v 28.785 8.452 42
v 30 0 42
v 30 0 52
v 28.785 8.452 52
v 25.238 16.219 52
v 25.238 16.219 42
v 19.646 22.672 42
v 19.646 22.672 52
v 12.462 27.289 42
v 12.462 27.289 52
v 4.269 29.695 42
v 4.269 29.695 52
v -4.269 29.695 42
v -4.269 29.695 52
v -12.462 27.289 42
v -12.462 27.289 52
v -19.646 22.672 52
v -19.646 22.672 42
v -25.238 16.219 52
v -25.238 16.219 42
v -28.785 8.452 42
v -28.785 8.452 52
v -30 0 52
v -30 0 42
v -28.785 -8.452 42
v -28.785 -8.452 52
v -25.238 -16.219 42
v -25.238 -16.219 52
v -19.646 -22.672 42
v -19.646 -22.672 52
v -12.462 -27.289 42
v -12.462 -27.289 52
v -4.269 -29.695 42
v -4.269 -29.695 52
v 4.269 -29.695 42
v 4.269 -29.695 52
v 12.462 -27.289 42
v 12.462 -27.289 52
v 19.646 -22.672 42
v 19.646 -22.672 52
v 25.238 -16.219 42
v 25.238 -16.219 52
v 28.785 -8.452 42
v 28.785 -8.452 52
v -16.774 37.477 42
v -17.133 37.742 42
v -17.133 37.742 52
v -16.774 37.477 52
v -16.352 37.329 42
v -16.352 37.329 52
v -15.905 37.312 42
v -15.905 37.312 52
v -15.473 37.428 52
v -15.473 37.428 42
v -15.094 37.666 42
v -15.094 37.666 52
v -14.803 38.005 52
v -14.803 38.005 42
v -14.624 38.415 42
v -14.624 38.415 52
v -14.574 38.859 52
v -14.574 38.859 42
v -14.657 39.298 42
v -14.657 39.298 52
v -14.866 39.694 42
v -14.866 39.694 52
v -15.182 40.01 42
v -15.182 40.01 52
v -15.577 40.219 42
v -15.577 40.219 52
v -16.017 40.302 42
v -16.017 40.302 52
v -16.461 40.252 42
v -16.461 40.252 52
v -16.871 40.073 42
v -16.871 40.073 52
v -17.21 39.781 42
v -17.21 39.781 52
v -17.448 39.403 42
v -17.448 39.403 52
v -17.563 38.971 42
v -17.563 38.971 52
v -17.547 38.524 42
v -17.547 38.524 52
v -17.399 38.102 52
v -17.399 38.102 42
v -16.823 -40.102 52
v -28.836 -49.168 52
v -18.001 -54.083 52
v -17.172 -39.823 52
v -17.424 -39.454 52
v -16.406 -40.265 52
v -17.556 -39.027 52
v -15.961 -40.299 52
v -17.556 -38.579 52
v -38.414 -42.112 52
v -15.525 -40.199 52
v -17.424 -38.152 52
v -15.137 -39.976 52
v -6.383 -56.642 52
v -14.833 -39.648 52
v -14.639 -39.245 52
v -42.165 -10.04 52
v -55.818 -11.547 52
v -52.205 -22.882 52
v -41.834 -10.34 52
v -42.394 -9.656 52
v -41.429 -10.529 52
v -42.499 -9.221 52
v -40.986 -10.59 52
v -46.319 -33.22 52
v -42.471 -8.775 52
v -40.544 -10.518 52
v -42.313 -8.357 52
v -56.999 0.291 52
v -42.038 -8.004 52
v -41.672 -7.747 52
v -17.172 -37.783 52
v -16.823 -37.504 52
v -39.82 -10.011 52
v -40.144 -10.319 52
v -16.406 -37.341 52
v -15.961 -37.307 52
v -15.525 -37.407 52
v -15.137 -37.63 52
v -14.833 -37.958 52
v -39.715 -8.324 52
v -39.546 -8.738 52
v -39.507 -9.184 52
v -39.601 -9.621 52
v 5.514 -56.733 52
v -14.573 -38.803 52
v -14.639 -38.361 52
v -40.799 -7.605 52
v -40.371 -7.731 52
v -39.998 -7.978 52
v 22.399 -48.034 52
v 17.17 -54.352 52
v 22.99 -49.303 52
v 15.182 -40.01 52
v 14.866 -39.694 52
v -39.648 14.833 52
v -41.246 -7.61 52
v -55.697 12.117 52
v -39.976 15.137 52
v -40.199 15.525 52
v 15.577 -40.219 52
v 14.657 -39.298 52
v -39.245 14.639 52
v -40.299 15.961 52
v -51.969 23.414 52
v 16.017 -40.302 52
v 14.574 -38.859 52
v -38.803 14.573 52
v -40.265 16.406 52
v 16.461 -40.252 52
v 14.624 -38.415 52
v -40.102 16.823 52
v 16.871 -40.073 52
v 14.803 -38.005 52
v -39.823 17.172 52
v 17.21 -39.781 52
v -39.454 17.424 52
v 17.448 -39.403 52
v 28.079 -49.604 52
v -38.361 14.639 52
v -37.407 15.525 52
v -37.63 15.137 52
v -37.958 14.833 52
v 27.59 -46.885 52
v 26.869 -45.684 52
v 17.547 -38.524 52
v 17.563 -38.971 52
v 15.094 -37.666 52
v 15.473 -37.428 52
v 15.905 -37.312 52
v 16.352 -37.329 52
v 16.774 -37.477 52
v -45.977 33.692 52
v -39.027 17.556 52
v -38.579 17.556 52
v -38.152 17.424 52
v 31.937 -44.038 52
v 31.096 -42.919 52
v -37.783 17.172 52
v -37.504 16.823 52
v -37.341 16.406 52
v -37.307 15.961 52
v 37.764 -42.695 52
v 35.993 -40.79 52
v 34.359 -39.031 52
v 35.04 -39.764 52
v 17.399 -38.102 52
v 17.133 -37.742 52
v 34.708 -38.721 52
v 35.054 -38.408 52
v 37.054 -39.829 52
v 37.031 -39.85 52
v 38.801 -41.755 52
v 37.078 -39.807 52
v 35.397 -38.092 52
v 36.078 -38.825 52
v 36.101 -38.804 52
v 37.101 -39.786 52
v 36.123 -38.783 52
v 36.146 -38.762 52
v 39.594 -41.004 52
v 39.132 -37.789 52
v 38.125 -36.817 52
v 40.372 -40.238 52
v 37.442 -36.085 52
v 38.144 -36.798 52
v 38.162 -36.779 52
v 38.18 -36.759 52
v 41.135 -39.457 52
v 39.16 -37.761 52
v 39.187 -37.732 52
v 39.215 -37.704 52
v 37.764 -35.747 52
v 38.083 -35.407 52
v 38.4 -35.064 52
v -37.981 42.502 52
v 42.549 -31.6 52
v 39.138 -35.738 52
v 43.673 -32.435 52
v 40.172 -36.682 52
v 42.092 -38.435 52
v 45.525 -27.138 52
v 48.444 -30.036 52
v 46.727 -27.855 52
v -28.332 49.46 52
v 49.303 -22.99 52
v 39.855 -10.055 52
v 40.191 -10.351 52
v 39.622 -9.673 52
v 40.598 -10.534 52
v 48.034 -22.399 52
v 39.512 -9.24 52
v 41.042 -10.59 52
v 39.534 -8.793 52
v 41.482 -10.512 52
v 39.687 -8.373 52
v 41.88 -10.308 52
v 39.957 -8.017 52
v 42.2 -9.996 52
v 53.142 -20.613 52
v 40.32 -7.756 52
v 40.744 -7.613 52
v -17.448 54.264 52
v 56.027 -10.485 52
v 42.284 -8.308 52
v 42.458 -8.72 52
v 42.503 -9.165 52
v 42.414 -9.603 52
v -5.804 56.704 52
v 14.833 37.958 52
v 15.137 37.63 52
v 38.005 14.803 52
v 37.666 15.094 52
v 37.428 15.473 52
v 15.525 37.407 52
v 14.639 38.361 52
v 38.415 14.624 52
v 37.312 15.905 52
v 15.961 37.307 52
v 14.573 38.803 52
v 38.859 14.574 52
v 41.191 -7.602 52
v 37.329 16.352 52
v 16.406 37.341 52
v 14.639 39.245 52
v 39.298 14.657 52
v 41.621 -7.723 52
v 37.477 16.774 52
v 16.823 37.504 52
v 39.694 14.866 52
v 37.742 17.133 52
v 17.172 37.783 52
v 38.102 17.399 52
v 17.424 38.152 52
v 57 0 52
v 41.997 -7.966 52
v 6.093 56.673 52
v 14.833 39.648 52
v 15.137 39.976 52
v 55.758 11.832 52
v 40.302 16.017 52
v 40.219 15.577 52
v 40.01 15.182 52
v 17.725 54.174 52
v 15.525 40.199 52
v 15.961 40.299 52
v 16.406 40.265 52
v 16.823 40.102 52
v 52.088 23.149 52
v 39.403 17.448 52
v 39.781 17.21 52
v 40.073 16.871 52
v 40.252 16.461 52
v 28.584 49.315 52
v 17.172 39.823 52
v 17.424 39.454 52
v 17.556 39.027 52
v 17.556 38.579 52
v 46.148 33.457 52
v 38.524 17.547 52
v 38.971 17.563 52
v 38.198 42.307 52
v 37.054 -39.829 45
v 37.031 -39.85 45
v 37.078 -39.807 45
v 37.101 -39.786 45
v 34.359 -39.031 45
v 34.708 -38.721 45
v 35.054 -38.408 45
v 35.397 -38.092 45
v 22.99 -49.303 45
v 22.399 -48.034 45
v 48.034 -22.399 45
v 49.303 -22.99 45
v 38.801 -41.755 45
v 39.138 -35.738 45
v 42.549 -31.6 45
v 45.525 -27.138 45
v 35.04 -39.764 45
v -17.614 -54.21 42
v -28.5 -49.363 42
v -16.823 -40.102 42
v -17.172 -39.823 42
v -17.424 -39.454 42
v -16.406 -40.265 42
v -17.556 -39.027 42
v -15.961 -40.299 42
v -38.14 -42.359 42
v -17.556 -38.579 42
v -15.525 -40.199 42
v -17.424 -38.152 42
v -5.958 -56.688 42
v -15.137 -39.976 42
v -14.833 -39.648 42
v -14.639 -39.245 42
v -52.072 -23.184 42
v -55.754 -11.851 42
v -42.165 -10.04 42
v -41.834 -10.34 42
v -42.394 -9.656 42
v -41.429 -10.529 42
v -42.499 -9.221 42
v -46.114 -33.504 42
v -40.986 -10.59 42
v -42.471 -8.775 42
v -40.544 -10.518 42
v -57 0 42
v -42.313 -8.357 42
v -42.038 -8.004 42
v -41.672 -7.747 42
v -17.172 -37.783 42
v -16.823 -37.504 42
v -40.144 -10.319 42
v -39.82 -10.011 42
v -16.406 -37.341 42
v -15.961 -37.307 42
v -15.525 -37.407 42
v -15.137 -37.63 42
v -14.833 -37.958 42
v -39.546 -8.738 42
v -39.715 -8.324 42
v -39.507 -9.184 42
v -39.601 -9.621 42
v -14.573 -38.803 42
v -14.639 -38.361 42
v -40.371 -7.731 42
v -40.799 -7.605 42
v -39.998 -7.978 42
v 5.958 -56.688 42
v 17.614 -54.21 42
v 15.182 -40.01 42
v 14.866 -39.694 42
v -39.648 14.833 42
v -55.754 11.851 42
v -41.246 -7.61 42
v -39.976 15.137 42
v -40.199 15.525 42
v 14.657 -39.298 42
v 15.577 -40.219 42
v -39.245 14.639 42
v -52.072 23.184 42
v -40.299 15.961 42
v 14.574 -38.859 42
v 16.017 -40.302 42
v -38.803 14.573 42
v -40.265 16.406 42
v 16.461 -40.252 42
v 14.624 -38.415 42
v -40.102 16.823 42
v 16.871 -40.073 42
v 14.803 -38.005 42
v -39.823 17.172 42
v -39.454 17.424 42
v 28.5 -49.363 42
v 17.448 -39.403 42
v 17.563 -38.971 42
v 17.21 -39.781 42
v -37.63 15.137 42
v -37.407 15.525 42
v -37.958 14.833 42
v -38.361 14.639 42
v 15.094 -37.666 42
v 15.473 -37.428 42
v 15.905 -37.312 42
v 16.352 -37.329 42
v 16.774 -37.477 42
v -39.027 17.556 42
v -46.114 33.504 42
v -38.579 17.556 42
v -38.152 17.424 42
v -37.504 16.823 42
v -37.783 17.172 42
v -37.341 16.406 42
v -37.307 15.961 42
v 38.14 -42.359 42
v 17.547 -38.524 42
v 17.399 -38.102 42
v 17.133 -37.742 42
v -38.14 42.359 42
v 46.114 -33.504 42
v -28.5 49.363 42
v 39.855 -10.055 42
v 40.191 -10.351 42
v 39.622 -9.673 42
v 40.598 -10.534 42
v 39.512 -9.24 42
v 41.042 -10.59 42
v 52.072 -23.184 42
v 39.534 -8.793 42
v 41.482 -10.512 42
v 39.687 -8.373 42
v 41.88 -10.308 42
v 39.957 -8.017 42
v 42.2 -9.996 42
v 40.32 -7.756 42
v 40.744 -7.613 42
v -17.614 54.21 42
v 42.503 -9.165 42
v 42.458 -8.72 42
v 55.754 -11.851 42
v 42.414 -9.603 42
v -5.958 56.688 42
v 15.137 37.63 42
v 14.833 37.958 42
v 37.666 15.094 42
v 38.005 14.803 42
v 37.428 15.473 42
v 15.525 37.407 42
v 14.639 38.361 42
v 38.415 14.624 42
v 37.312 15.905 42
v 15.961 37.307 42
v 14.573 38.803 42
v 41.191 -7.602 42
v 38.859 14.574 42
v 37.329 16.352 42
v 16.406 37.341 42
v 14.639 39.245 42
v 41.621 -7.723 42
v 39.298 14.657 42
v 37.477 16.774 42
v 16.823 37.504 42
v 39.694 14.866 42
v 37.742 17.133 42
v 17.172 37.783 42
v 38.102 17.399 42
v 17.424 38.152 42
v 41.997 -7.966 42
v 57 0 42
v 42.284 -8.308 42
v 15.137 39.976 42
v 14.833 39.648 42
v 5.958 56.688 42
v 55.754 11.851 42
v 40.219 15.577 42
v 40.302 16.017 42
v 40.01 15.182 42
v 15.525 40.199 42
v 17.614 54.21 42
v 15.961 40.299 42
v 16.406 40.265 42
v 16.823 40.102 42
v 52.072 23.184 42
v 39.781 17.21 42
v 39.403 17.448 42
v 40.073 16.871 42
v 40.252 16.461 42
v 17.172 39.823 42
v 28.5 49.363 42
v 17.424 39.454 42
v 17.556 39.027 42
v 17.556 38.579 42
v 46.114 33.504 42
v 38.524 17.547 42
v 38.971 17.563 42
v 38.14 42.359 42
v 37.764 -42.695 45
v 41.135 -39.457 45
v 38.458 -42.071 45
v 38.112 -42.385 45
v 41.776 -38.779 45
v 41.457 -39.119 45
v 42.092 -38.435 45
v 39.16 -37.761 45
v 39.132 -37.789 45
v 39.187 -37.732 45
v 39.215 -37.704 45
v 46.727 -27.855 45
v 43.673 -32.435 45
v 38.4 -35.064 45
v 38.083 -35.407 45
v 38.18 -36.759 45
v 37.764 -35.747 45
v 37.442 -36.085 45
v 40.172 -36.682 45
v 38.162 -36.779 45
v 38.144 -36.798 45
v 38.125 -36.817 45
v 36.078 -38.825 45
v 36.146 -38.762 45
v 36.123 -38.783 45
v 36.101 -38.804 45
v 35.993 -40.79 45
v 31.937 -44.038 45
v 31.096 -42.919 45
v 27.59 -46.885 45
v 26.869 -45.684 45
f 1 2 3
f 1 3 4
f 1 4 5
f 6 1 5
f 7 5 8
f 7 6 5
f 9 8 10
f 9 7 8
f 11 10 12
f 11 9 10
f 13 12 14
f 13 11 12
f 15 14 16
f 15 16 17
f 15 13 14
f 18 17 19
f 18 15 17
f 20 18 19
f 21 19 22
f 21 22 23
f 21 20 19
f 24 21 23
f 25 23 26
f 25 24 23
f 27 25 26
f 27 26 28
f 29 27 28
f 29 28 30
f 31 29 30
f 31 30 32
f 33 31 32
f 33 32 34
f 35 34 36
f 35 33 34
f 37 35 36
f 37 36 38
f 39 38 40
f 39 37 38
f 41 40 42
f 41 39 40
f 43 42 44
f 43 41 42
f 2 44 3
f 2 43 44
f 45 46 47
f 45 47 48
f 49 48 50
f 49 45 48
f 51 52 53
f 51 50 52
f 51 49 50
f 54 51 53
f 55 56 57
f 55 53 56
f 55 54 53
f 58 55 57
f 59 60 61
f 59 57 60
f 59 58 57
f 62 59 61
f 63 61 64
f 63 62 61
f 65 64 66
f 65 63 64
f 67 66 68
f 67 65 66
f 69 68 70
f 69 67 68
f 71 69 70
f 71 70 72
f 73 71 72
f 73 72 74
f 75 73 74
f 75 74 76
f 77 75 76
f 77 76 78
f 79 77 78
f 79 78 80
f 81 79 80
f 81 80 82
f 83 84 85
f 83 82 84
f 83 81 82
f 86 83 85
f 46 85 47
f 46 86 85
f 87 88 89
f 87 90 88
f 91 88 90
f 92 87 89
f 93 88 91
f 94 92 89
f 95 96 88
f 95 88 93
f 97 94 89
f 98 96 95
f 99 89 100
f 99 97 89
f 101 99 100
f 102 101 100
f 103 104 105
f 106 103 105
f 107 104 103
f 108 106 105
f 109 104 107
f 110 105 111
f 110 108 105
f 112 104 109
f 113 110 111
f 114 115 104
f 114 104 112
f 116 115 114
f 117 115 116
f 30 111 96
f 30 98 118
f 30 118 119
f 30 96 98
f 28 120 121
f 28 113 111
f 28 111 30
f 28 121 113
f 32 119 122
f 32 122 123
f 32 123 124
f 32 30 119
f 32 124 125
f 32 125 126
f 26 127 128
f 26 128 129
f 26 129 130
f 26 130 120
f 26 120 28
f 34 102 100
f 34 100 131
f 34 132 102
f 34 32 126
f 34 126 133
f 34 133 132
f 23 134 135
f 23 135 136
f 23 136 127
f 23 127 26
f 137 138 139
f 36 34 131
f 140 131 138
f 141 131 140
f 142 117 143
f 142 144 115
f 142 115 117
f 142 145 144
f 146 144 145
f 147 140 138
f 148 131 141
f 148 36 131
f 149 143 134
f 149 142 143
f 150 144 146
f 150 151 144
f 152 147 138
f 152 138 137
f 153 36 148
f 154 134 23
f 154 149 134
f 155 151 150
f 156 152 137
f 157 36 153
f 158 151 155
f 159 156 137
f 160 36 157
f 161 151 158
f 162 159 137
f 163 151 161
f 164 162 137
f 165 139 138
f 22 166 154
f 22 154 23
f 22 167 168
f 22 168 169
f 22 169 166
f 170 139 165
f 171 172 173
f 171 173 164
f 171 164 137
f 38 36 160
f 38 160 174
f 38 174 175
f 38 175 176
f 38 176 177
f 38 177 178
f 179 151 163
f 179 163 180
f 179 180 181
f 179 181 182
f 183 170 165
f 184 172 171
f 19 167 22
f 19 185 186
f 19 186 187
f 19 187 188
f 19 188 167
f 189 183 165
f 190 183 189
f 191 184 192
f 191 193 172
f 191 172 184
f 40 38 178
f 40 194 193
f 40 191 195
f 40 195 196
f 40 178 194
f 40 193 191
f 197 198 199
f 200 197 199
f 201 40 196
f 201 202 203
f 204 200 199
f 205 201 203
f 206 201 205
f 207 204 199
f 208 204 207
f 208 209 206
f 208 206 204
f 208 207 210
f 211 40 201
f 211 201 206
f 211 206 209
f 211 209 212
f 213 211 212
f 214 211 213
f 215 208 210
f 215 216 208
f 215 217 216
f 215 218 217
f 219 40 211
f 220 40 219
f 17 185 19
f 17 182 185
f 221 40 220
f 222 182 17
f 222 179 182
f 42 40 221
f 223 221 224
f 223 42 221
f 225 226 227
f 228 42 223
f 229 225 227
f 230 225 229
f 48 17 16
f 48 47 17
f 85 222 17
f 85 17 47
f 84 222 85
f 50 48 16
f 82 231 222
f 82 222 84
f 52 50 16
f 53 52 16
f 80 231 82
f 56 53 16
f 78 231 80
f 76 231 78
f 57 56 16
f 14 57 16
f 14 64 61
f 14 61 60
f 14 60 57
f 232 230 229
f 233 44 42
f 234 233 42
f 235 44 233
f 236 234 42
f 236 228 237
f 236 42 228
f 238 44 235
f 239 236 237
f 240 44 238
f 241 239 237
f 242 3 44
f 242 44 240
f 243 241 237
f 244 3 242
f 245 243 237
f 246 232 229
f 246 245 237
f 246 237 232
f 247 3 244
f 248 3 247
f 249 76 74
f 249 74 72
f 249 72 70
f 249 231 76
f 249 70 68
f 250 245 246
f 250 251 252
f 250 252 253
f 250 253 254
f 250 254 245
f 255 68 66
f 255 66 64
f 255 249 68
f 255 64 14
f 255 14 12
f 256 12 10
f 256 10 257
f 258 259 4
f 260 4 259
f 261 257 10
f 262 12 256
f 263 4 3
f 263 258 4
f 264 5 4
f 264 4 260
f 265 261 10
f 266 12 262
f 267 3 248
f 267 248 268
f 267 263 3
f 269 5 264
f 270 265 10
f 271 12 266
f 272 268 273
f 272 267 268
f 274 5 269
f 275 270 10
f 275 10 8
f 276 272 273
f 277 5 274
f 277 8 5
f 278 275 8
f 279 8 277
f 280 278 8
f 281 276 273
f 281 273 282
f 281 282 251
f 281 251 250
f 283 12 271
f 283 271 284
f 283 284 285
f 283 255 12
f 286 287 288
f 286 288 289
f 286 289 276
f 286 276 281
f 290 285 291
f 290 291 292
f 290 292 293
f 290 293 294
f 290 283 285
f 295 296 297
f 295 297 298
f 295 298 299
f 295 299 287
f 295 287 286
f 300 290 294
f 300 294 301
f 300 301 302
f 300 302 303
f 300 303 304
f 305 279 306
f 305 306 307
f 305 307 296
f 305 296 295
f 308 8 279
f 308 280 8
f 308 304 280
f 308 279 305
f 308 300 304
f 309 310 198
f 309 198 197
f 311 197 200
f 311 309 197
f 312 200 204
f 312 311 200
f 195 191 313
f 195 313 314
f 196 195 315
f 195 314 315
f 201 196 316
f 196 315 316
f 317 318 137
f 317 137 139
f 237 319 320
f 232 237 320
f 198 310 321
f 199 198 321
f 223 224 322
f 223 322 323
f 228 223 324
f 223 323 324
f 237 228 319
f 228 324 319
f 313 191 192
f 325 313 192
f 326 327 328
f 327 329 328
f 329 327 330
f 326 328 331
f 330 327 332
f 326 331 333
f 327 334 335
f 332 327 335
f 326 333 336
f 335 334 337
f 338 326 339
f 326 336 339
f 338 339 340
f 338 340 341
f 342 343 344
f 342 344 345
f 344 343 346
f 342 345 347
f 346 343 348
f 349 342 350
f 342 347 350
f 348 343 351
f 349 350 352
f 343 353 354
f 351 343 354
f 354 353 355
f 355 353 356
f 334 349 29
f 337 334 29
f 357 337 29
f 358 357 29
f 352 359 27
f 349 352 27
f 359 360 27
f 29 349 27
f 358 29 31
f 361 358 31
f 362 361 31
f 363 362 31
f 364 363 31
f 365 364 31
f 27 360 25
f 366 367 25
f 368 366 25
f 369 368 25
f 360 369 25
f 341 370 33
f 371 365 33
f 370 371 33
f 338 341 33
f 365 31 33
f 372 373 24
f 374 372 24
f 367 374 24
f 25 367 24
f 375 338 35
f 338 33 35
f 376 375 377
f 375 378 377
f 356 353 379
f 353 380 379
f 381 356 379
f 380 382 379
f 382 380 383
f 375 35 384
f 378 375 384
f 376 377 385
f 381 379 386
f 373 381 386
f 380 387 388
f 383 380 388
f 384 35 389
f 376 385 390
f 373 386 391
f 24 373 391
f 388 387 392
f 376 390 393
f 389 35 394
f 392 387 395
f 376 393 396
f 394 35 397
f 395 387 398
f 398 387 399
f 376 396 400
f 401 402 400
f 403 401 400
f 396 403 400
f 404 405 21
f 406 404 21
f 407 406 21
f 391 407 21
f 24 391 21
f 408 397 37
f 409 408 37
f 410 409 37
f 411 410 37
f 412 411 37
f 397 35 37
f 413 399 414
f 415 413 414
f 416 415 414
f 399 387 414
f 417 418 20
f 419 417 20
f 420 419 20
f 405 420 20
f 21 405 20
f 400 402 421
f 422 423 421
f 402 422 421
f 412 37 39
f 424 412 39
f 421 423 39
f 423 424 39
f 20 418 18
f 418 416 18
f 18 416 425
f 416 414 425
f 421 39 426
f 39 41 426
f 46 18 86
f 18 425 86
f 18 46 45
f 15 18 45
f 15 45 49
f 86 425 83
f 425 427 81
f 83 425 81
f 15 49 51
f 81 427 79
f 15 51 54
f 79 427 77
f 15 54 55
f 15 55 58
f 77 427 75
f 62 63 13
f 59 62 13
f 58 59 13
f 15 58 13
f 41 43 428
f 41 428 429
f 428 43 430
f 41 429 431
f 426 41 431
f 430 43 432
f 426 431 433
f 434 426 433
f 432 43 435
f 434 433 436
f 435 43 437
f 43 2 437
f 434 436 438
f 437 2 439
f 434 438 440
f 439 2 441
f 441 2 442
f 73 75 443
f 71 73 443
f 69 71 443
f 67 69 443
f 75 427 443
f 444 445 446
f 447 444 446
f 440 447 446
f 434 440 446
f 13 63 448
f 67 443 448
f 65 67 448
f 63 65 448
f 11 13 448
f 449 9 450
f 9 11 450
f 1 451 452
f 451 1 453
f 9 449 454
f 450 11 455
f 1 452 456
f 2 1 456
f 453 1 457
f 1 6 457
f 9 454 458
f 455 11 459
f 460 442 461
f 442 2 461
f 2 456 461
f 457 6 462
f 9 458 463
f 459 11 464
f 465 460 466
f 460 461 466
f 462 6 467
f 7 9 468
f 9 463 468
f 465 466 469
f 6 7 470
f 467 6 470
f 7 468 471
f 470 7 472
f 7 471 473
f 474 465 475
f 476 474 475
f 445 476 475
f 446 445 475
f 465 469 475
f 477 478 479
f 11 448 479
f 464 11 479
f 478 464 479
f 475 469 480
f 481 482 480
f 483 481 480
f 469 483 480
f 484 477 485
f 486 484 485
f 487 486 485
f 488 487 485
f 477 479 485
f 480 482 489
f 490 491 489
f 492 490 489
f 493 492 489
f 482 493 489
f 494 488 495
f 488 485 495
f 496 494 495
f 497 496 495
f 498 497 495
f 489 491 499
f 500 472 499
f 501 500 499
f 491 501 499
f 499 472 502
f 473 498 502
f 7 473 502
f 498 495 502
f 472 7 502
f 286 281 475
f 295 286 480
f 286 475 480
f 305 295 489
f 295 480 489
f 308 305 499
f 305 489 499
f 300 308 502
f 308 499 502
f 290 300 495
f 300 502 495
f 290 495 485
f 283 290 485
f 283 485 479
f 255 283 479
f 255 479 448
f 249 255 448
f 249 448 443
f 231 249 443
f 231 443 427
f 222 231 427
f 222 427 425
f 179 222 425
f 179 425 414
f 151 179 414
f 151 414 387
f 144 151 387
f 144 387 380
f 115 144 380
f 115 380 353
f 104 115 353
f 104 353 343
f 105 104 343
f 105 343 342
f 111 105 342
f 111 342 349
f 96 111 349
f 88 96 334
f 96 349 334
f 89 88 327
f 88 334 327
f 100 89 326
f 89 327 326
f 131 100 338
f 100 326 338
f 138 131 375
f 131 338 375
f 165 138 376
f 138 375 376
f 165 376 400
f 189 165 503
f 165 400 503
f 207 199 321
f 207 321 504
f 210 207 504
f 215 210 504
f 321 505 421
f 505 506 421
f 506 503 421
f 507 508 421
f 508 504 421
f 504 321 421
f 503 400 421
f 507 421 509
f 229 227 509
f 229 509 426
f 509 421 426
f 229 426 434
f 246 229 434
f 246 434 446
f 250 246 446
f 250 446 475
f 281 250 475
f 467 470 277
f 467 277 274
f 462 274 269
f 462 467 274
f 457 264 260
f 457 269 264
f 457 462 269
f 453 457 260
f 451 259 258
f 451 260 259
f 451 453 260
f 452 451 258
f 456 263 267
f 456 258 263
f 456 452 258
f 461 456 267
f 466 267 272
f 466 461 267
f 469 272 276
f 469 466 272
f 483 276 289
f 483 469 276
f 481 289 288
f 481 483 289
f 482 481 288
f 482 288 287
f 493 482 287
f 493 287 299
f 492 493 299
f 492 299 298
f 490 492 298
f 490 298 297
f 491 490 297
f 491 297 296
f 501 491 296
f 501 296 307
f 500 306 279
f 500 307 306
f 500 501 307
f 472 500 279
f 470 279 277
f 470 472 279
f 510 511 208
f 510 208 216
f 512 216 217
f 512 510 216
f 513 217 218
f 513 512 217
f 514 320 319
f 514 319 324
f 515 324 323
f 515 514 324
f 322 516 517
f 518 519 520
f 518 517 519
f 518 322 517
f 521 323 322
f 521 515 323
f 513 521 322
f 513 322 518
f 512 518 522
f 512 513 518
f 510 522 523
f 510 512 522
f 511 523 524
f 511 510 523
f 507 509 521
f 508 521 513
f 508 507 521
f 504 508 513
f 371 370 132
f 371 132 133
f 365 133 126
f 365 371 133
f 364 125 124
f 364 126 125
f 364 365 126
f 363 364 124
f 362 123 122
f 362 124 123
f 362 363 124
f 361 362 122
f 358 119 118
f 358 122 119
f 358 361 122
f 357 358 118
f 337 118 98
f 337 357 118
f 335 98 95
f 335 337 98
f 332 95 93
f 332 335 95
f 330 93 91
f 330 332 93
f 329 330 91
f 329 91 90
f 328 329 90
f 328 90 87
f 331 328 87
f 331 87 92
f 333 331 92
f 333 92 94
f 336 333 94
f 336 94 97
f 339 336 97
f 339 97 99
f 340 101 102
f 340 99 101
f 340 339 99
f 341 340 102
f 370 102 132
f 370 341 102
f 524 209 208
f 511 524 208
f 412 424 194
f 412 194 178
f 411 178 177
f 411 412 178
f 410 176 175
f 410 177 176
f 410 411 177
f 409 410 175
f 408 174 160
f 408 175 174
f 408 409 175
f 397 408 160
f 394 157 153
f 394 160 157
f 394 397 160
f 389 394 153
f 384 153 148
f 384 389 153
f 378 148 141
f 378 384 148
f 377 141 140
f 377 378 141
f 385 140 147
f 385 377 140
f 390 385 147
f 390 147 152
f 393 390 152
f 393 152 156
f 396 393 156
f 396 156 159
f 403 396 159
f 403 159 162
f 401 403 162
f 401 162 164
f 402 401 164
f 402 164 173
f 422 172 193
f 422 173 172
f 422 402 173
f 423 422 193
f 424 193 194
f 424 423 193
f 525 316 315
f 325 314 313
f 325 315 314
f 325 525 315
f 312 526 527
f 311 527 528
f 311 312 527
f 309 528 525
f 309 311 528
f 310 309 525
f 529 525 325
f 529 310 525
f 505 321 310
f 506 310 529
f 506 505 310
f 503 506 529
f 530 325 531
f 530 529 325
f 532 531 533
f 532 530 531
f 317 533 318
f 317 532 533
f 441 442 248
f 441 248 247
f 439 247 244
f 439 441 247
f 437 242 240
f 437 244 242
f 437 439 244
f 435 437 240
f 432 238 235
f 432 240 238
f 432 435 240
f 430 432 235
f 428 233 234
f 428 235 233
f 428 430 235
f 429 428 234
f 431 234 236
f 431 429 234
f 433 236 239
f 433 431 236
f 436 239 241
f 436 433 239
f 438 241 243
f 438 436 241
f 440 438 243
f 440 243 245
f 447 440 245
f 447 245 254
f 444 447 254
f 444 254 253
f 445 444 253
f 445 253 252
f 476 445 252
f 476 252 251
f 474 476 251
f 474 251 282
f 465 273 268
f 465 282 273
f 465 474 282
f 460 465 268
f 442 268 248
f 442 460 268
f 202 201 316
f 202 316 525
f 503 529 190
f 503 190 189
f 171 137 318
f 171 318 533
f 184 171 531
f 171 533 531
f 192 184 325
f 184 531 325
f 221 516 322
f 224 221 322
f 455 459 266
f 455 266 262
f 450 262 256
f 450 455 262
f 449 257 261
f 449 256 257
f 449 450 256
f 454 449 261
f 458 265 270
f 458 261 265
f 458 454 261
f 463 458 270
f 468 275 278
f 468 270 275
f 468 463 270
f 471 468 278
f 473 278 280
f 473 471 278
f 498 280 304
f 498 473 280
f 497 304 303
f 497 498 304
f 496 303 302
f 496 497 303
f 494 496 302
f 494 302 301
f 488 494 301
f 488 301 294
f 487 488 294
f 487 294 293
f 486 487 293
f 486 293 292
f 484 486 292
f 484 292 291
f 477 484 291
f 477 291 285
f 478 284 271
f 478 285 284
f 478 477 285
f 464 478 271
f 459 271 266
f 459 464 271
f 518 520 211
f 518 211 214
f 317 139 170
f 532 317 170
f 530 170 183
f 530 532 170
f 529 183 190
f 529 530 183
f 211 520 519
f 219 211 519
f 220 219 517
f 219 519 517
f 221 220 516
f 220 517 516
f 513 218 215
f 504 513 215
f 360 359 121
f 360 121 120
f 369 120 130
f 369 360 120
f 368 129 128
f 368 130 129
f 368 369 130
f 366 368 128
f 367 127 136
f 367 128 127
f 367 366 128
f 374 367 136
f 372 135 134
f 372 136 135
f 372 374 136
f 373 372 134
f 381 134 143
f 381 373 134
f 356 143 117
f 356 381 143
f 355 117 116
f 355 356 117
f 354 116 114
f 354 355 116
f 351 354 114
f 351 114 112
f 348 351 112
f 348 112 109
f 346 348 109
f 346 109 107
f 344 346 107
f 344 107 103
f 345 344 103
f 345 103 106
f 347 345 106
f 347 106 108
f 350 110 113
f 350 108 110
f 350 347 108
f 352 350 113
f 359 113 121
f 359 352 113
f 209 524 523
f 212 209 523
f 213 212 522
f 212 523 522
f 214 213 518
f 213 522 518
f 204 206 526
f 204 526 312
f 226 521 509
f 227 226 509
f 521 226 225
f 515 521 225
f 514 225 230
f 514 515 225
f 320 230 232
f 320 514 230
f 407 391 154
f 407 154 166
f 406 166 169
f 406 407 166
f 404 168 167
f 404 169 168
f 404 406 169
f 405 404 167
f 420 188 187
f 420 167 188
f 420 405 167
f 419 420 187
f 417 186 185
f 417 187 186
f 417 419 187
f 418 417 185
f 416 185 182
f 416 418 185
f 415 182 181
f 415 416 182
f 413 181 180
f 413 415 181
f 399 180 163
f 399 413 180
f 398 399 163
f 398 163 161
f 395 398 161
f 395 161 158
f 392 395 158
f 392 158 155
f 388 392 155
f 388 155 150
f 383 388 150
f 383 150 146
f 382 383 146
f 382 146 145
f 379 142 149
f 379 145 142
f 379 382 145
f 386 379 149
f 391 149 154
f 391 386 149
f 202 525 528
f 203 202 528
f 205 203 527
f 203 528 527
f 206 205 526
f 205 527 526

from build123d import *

# Parameters (mm, degrees)
BOX311_W                    = 60
BOX311_H                    = 60
BOX311_DEPTH                = 7
BOX311_PLACEMENT_ANGLE      = 1
BOX312_W                    = 60
BOX312_H                    = 60
BOX312_DEPTH                = 7
BOX312_PLACEMENT_ANGLE      = 2
BOX310_W                    = 120
BOX310_H                    = 60
BOX310_DEPTH                = 7
TUBE084_R                   = 54.4
TUBE084_R_2                 = 53
TUBE084_DEPTH               = 7
BOX308_W                    = 60
BOX308_H                    = 60
BOX308_DEPTH                = 7
BOX308_PLACEMENT_ANGLE      = 20
BOX307_W                    = 60
BOX307_H                    = 60
BOX307_DEPTH                = 7
BOX307_PLACEMENT_ANGLE      = 20
BOX309_W                    = 120
BOX309_H                    = 60
BOX309_DEPTH                = 7
TUBE085_R                   = 54.4
TUBE085_R_2                 = 53
TUBE085_DEPTH               = 7
CUT335_PLACEMENT_ANGLE      = 225
CYLINDER804_R               = 52
CYLINDER804_DEPTH           = 7
BOX313_W                    = 1.4
BOX313_H                    = 60
BOX313_DEPTH                = 7
BOX313_PLACEMENT_ANGLE      = 2.7
BOX314_W                    = 1.4
BOX314_H                    = 60
BOX314_DEPTH                = 7
BOX314_PLACEMENT_ANGLE      = 2
CUT339_PLACEMENT_ANGLE      = 224.9
CYLINDER808_R               = 1.5
CYLINDER808_DEPTH           = 100
CYLINDER808_PLACEMENT_ANGLE = 100
CYLINDER806_R               = 1.5
CYLINDER806_DEPTH           = 100
CYLINDER806_PLACEMENT_ANGLE = 135
CYLINDER810_R               = 1.5
CYLINDER810_DEPTH           = 100
CYLINDER812_R               = 1.5
CYLINDER812_DEPTH           = 100
CYLINDER812_PLACEMENT_ANGLE = 225
CYLINDER805_R               = 1.5
CYLINDER805_DEPTH           = 100
CYLINDER809_R               = 1.5
CYLINDER809_DEPTH           = 100
CYLINDER809_PLACEMENT_ANGLE = 55
CYLINDER807_R               = 1.5
CYLINDER807_DEPTH           = 100
CYLINDER811_R               = 1.5
CYLINDER811_DEPTH           = 100
CYLINDER811_PLACEMENT_ANGLE = 45
TUBE087_R                   = 57
TUBE087_R_2                 = 30
TUBE087_DEPTH               = 10


with BuildPart() as krychle311:
    # Box311 → Box311 (new body)
    with BuildSketch(Plane.XY):
        with Locations((30, 30)):
            Rectangle(BOX311_W, BOX311_H)
    extrude(amount=BOX311_DEPTH)


with BuildPart() as krychle311_1:
    # Box311 placement: moved
    add(krychle311.part.moved(Location((-59.990862, -1.047144, -22))).rotate(Axis((-59.990862, -1.047144, -22), (0, 0, 1)), BOX311_PLACEMENT_ANGLE))


with BuildPart() as compound719:
    # Box312 → Box312 (new body)
    with BuildSketch(Plane.XY):
        with Locations((30, 30)):
            Rectangle(BOX312_W, BOX312_H)
    extrude(amount=BOX312_DEPTH)


with BuildPart() as compound719_1:
    # Box312 placement: moved
    add(compound719.part.moved(Location((0, 0, -22))).rotate(Axis((0, 0, -22), (0, 0, -1)), BOX312_PLACEMENT_ANGLE))

    # Compound719: union Krychle311
    add(krychle311_1.part)


with BuildPart() as krychle310:
    # Box310 → Box310 (new body)
    with BuildSketch(Plane(origin=(-60, -60, -22), x_dir=(1, 0, 0), z_dir=(0, 0, 1))):
        with Locations((60, 30)):
            Rectangle(BOX310_W, BOX310_H)
    extrude(amount=BOX310_DEPTH)


with BuildPart() as cut338:
    # Tube084 → Tube084 (new body)
    with BuildSketch(Plane.XY.offset(-22)):
        Circle(TUBE084_R)
        Circle(TUBE084_R_2, mode=Mode.SUBTRACT)
    extrude(amount=TUBE084_DEPTH)

    # Cut337: cut Krychle310
    add(krychle310.part, mode=Mode.SUBTRACT)

    # Cut338: cut Compound719
    add(compound719_1.part, mode=Mode.SUBTRACT)


with BuildPart() as cut338_1:
    # Cut338 placement: moved
    add(cut338.part.moved(Location((0, 0, -7))))


with BuildPart() as krychle308:
    # Box308 → Box308 (new body)
    with BuildSketch(Plane.XY):
        with Locations((30, 30)):
            Rectangle(BOX308_W, BOX308_H)
    extrude(amount=BOX308_DEPTH)


with BuildPart() as krychle308_1:
    # Box308 placement: moved
    add(krychle308.part.moved(Location((-56.381557, -20.521209, -22))).rotate(Axis((-56.381557, -20.521209, -22), (0, 0, 1)), BOX308_PLACEMENT_ANGLE))


with BuildPart() as compound718:
    # Box307 → Box307 (new body)
    with BuildSketch(Plane.XY):
        with Locations((30, 30)):
            Rectangle(BOX307_W, BOX307_H)
    extrude(amount=BOX307_DEPTH)


with BuildPart() as compound718_1:
    # Box307 placement: moved
    add(compound718.part.moved(Location((0, 0, -22))).rotate(Axis((0, 0, -22), (0, 0, -1)), BOX307_PLACEMENT_ANGLE))

    # Compound718: union Krychle308
    add(krychle308_1.part)


with BuildPart() as krychle309:
    # Box309 → Box309 (new body)
    with BuildSketch(Plane(origin=(-60, -60, -22), x_dir=(1, 0, 0), z_dir=(0, 0, 1))):
        with Locations((60, 30)):
            Rectangle(BOX309_W, BOX309_H)
    extrude(amount=BOX309_DEPTH)


with BuildPart() as cut335:
    # Tube085 → Tube085 (new body)
    with BuildSketch(Plane.XY.offset(-22)):
        Circle(TUBE085_R)
        Circle(TUBE085_R_2, mode=Mode.SUBTRACT)
    extrude(amount=TUBE085_DEPTH)

    # Cut334: cut Krychle309
    add(krychle309.part, mode=Mode.SUBTRACT)

    # Cut336: cut Compound718
    add(compound718_1.part, mode=Mode.SUBTRACT)


with BuildPart() as cut335_1:
    # Cut336 placement: moved
    add(cut335.part.moved(Location((0, 0, -7))))

    # Cut335: cut Cut338
    add(cut338_1.part, mode=Mode.SUBTRACT)


with BuildPart() as cut335_2:
    # Cut335 placement: moved
    add(cut335_1.part.moved(Location((0, 0, 74))).rotate(Axis((0, 0, 74), (0, 0, 1)), CUT335_PLACEMENT_ANGLE))


with BuildPart() as v_lec804:
    # Cylinder804 → Cylinder804 (new body)
    with BuildSketch(Plane.XY.offset(-22)):
        Circle(CYLINDER804_R)
    extrude(amount=CYLINDER804_DEPTH)


with BuildPart() as krychle313:
    # Box313 → Box313 (new body)
    with BuildSketch(Plane.XY):
        with Locations((0.7, 30)):
            Rectangle(BOX313_W, BOX313_H)
    extrude(amount=BOX313_DEPTH)


with BuildPart() as krychle313_1:
    # Box313 placement: moved
    add(krychle313.part.moved(Location((0, 0, -22))).rotate(Axis((0, 0, -22), (0, 0, 1)), BOX313_PLACEMENT_ANGLE))


with BuildPart() as cut339:
    # Box314 → Box314 (new body)
    with BuildSketch(Plane.XY):
        with Locations((0.7, 30)):
            Rectangle(BOX314_W, BOX314_H)
    extrude(amount=BOX314_DEPTH)


with BuildPart() as cut339_1:
    # Box314 placement: moved
    add(cut339.part.moved(Location((0, 0, -22))).rotate(Axis((0, 0, -22), (0, 0, -1)), BOX314_PLACEMENT_ANGLE))

    # Compound720: union Krychle313
    add(krychle313_1.part)

    # Cut339: cut Válec804
    add(v_lec804.part, mode=Mode.SUBTRACT)


with BuildPart() as cut339_2:
    # Cut339 placement: moved
    add(cut339_1.part.moved(Location((0, 0, 67))).rotate(Axis((0, 0, 67), (0, 0, 1)), CUT339_PLACEMENT_ANGLE))


with BuildPart() as v_lec808:
    # Cylinder808 → Cylinder808 (new body)
    with BuildSketch(Plane.XY):
        Circle(CYLINDER808_R)
    extrude(amount=CYLINDER808_DEPTH)


with BuildPart() as v_lec808_1:
    # Cylinder808 placement: moved
    add(v_lec808.part.moved(Location((41.004432, -9.090464, 0))).rotate(Axis((41.004432, -9.090464, 0), (0, 0, 1)), CYLINDER808_PLACEMENT_ANGLE))


with BuildPart() as v_lec806:
    # Cylinder806 → Cylinder806 (new body)
    with BuildSketch(Plane.XY):
        Circle(CYLINDER806_R)
    extrude(amount=CYLINDER806_DEPTH)


with BuildPart() as v_lec806_1:
    # Cylinder806 placement: moved
    add(v_lec806.part.moved(Location((38.80294, 16.072704, 0))).rotate(Axis((38.80294, 16.072704, 0), (0, 0, 1)), CYLINDER806_PLACEMENT_ANGLE))


with BuildPart() as v_lec810:
    # Cylinder810 → Cylinder810 (new body)
    with BuildSketch(Plane(origin=(16.072704, 38.80294, 0), x_dir=(-1, 0, 0), z_dir=(0, 0, 1))):
        Circle(CYLINDER810_R)
    extrude(amount=CYLINDER810_DEPTH)


with BuildPart() as v_lec812:
    # Cylinder812 → Cylinder812 (new body)
    with BuildSketch(Plane.XY):
        Circle(CYLINDER812_R)
    extrude(amount=CYLINDER812_DEPTH)


with BuildPart() as v_lec812_1:
    # Cylinder812 placement: moved
    add(v_lec812.part.moved(Location((-16.072704, 38.80294, 0))).rotate(Axis((-16.072704, 38.80294, 0), (0, 0, 1)), CYLINDER812_PLACEMENT_ANGLE))


with BuildPart() as v_lec805:
    # Cylinder805 → Cylinder805 (new body)
    with BuildSketch(Plane(origin=(-38.80294, 16.072704, 0), x_dir=(0, -1, 0), z_dir=(0, 0, 1))):
        Circle(CYLINDER805_R)
    extrude(amount=CYLINDER805_DEPTH)


with BuildPart() as v_lec809:
    # Cylinder809 → Cylinder809 (new body)
    with BuildSketch(Plane.XY):
        Circle(CYLINDER809_R)
    extrude(amount=CYLINDER809_DEPTH)


with BuildPart() as v_lec809_1:
    # Cylinder809 placement: moved
    add(v_lec809.part.moved(Location((-41.004432, -9.090464, 0))).rotate(Axis((-41.004432, -9.090464, 0), (0, 0, -1)), CYLINDER809_PLACEMENT_ANGLE))


with BuildPart() as v_lec807:
    # Cylinder807 → Cylinder807 (new body)
    with BuildSketch(Plane(origin=(-16.072704, -38.80294, 0), x_dir=(1, 0, 0), z_dir=(0, 0, 1))):
        Circle(CYLINDER807_R)
    extrude(amount=CYLINDER807_DEPTH)


with BuildPart() as compound721:
    # Cylinder811 → Cylinder811 (new body)
    with BuildSketch(Plane.XY):
        Circle(CYLINDER811_R)
    extrude(amount=CYLINDER811_DEPTH)


with BuildPart() as compound721_1:
    # Cylinder811 placement: moved
    add(compound721.part.moved(Location((16.072704, -38.80294, 0))).rotate(Axis((16.072704, -38.80294, 0), (0, 0, 1)), CYLINDER811_PLACEMENT_ANGLE))

    # Compound721: union Válec808, Válec806, Válec810, Válec812, Válec805, Válec809, Válec807
    add(v_lec808_1.part)
    add(v_lec806_1.part)
    add(v_lec810.part)
    add(v_lec812_1.part)
    add(v_lec805.part)
    add(v_lec809_1.part)
    add(v_lec807.part)


with BuildPart() as cut342:
    # Tube087 → Tube087 (new body)
    with BuildSketch(Plane.XY.offset(42)):
        Circle(TUBE087_R)
        Circle(TUBE087_R_2, mode=Mode.SUBTRACT)
    extrude(amount=TUBE087_DEPTH)

    # Cut340: cut Compound721
    add(compound721_1.part, mode=Mode.SUBTRACT)

    # Cut341: cut Cut339
    add(cut339_2.part, mode=Mode.SUBTRACT)

    # Cut342: cut Cut335
    add(cut335_2.part, mode=Mode.SUBTRACT)


solid = cut342.part
